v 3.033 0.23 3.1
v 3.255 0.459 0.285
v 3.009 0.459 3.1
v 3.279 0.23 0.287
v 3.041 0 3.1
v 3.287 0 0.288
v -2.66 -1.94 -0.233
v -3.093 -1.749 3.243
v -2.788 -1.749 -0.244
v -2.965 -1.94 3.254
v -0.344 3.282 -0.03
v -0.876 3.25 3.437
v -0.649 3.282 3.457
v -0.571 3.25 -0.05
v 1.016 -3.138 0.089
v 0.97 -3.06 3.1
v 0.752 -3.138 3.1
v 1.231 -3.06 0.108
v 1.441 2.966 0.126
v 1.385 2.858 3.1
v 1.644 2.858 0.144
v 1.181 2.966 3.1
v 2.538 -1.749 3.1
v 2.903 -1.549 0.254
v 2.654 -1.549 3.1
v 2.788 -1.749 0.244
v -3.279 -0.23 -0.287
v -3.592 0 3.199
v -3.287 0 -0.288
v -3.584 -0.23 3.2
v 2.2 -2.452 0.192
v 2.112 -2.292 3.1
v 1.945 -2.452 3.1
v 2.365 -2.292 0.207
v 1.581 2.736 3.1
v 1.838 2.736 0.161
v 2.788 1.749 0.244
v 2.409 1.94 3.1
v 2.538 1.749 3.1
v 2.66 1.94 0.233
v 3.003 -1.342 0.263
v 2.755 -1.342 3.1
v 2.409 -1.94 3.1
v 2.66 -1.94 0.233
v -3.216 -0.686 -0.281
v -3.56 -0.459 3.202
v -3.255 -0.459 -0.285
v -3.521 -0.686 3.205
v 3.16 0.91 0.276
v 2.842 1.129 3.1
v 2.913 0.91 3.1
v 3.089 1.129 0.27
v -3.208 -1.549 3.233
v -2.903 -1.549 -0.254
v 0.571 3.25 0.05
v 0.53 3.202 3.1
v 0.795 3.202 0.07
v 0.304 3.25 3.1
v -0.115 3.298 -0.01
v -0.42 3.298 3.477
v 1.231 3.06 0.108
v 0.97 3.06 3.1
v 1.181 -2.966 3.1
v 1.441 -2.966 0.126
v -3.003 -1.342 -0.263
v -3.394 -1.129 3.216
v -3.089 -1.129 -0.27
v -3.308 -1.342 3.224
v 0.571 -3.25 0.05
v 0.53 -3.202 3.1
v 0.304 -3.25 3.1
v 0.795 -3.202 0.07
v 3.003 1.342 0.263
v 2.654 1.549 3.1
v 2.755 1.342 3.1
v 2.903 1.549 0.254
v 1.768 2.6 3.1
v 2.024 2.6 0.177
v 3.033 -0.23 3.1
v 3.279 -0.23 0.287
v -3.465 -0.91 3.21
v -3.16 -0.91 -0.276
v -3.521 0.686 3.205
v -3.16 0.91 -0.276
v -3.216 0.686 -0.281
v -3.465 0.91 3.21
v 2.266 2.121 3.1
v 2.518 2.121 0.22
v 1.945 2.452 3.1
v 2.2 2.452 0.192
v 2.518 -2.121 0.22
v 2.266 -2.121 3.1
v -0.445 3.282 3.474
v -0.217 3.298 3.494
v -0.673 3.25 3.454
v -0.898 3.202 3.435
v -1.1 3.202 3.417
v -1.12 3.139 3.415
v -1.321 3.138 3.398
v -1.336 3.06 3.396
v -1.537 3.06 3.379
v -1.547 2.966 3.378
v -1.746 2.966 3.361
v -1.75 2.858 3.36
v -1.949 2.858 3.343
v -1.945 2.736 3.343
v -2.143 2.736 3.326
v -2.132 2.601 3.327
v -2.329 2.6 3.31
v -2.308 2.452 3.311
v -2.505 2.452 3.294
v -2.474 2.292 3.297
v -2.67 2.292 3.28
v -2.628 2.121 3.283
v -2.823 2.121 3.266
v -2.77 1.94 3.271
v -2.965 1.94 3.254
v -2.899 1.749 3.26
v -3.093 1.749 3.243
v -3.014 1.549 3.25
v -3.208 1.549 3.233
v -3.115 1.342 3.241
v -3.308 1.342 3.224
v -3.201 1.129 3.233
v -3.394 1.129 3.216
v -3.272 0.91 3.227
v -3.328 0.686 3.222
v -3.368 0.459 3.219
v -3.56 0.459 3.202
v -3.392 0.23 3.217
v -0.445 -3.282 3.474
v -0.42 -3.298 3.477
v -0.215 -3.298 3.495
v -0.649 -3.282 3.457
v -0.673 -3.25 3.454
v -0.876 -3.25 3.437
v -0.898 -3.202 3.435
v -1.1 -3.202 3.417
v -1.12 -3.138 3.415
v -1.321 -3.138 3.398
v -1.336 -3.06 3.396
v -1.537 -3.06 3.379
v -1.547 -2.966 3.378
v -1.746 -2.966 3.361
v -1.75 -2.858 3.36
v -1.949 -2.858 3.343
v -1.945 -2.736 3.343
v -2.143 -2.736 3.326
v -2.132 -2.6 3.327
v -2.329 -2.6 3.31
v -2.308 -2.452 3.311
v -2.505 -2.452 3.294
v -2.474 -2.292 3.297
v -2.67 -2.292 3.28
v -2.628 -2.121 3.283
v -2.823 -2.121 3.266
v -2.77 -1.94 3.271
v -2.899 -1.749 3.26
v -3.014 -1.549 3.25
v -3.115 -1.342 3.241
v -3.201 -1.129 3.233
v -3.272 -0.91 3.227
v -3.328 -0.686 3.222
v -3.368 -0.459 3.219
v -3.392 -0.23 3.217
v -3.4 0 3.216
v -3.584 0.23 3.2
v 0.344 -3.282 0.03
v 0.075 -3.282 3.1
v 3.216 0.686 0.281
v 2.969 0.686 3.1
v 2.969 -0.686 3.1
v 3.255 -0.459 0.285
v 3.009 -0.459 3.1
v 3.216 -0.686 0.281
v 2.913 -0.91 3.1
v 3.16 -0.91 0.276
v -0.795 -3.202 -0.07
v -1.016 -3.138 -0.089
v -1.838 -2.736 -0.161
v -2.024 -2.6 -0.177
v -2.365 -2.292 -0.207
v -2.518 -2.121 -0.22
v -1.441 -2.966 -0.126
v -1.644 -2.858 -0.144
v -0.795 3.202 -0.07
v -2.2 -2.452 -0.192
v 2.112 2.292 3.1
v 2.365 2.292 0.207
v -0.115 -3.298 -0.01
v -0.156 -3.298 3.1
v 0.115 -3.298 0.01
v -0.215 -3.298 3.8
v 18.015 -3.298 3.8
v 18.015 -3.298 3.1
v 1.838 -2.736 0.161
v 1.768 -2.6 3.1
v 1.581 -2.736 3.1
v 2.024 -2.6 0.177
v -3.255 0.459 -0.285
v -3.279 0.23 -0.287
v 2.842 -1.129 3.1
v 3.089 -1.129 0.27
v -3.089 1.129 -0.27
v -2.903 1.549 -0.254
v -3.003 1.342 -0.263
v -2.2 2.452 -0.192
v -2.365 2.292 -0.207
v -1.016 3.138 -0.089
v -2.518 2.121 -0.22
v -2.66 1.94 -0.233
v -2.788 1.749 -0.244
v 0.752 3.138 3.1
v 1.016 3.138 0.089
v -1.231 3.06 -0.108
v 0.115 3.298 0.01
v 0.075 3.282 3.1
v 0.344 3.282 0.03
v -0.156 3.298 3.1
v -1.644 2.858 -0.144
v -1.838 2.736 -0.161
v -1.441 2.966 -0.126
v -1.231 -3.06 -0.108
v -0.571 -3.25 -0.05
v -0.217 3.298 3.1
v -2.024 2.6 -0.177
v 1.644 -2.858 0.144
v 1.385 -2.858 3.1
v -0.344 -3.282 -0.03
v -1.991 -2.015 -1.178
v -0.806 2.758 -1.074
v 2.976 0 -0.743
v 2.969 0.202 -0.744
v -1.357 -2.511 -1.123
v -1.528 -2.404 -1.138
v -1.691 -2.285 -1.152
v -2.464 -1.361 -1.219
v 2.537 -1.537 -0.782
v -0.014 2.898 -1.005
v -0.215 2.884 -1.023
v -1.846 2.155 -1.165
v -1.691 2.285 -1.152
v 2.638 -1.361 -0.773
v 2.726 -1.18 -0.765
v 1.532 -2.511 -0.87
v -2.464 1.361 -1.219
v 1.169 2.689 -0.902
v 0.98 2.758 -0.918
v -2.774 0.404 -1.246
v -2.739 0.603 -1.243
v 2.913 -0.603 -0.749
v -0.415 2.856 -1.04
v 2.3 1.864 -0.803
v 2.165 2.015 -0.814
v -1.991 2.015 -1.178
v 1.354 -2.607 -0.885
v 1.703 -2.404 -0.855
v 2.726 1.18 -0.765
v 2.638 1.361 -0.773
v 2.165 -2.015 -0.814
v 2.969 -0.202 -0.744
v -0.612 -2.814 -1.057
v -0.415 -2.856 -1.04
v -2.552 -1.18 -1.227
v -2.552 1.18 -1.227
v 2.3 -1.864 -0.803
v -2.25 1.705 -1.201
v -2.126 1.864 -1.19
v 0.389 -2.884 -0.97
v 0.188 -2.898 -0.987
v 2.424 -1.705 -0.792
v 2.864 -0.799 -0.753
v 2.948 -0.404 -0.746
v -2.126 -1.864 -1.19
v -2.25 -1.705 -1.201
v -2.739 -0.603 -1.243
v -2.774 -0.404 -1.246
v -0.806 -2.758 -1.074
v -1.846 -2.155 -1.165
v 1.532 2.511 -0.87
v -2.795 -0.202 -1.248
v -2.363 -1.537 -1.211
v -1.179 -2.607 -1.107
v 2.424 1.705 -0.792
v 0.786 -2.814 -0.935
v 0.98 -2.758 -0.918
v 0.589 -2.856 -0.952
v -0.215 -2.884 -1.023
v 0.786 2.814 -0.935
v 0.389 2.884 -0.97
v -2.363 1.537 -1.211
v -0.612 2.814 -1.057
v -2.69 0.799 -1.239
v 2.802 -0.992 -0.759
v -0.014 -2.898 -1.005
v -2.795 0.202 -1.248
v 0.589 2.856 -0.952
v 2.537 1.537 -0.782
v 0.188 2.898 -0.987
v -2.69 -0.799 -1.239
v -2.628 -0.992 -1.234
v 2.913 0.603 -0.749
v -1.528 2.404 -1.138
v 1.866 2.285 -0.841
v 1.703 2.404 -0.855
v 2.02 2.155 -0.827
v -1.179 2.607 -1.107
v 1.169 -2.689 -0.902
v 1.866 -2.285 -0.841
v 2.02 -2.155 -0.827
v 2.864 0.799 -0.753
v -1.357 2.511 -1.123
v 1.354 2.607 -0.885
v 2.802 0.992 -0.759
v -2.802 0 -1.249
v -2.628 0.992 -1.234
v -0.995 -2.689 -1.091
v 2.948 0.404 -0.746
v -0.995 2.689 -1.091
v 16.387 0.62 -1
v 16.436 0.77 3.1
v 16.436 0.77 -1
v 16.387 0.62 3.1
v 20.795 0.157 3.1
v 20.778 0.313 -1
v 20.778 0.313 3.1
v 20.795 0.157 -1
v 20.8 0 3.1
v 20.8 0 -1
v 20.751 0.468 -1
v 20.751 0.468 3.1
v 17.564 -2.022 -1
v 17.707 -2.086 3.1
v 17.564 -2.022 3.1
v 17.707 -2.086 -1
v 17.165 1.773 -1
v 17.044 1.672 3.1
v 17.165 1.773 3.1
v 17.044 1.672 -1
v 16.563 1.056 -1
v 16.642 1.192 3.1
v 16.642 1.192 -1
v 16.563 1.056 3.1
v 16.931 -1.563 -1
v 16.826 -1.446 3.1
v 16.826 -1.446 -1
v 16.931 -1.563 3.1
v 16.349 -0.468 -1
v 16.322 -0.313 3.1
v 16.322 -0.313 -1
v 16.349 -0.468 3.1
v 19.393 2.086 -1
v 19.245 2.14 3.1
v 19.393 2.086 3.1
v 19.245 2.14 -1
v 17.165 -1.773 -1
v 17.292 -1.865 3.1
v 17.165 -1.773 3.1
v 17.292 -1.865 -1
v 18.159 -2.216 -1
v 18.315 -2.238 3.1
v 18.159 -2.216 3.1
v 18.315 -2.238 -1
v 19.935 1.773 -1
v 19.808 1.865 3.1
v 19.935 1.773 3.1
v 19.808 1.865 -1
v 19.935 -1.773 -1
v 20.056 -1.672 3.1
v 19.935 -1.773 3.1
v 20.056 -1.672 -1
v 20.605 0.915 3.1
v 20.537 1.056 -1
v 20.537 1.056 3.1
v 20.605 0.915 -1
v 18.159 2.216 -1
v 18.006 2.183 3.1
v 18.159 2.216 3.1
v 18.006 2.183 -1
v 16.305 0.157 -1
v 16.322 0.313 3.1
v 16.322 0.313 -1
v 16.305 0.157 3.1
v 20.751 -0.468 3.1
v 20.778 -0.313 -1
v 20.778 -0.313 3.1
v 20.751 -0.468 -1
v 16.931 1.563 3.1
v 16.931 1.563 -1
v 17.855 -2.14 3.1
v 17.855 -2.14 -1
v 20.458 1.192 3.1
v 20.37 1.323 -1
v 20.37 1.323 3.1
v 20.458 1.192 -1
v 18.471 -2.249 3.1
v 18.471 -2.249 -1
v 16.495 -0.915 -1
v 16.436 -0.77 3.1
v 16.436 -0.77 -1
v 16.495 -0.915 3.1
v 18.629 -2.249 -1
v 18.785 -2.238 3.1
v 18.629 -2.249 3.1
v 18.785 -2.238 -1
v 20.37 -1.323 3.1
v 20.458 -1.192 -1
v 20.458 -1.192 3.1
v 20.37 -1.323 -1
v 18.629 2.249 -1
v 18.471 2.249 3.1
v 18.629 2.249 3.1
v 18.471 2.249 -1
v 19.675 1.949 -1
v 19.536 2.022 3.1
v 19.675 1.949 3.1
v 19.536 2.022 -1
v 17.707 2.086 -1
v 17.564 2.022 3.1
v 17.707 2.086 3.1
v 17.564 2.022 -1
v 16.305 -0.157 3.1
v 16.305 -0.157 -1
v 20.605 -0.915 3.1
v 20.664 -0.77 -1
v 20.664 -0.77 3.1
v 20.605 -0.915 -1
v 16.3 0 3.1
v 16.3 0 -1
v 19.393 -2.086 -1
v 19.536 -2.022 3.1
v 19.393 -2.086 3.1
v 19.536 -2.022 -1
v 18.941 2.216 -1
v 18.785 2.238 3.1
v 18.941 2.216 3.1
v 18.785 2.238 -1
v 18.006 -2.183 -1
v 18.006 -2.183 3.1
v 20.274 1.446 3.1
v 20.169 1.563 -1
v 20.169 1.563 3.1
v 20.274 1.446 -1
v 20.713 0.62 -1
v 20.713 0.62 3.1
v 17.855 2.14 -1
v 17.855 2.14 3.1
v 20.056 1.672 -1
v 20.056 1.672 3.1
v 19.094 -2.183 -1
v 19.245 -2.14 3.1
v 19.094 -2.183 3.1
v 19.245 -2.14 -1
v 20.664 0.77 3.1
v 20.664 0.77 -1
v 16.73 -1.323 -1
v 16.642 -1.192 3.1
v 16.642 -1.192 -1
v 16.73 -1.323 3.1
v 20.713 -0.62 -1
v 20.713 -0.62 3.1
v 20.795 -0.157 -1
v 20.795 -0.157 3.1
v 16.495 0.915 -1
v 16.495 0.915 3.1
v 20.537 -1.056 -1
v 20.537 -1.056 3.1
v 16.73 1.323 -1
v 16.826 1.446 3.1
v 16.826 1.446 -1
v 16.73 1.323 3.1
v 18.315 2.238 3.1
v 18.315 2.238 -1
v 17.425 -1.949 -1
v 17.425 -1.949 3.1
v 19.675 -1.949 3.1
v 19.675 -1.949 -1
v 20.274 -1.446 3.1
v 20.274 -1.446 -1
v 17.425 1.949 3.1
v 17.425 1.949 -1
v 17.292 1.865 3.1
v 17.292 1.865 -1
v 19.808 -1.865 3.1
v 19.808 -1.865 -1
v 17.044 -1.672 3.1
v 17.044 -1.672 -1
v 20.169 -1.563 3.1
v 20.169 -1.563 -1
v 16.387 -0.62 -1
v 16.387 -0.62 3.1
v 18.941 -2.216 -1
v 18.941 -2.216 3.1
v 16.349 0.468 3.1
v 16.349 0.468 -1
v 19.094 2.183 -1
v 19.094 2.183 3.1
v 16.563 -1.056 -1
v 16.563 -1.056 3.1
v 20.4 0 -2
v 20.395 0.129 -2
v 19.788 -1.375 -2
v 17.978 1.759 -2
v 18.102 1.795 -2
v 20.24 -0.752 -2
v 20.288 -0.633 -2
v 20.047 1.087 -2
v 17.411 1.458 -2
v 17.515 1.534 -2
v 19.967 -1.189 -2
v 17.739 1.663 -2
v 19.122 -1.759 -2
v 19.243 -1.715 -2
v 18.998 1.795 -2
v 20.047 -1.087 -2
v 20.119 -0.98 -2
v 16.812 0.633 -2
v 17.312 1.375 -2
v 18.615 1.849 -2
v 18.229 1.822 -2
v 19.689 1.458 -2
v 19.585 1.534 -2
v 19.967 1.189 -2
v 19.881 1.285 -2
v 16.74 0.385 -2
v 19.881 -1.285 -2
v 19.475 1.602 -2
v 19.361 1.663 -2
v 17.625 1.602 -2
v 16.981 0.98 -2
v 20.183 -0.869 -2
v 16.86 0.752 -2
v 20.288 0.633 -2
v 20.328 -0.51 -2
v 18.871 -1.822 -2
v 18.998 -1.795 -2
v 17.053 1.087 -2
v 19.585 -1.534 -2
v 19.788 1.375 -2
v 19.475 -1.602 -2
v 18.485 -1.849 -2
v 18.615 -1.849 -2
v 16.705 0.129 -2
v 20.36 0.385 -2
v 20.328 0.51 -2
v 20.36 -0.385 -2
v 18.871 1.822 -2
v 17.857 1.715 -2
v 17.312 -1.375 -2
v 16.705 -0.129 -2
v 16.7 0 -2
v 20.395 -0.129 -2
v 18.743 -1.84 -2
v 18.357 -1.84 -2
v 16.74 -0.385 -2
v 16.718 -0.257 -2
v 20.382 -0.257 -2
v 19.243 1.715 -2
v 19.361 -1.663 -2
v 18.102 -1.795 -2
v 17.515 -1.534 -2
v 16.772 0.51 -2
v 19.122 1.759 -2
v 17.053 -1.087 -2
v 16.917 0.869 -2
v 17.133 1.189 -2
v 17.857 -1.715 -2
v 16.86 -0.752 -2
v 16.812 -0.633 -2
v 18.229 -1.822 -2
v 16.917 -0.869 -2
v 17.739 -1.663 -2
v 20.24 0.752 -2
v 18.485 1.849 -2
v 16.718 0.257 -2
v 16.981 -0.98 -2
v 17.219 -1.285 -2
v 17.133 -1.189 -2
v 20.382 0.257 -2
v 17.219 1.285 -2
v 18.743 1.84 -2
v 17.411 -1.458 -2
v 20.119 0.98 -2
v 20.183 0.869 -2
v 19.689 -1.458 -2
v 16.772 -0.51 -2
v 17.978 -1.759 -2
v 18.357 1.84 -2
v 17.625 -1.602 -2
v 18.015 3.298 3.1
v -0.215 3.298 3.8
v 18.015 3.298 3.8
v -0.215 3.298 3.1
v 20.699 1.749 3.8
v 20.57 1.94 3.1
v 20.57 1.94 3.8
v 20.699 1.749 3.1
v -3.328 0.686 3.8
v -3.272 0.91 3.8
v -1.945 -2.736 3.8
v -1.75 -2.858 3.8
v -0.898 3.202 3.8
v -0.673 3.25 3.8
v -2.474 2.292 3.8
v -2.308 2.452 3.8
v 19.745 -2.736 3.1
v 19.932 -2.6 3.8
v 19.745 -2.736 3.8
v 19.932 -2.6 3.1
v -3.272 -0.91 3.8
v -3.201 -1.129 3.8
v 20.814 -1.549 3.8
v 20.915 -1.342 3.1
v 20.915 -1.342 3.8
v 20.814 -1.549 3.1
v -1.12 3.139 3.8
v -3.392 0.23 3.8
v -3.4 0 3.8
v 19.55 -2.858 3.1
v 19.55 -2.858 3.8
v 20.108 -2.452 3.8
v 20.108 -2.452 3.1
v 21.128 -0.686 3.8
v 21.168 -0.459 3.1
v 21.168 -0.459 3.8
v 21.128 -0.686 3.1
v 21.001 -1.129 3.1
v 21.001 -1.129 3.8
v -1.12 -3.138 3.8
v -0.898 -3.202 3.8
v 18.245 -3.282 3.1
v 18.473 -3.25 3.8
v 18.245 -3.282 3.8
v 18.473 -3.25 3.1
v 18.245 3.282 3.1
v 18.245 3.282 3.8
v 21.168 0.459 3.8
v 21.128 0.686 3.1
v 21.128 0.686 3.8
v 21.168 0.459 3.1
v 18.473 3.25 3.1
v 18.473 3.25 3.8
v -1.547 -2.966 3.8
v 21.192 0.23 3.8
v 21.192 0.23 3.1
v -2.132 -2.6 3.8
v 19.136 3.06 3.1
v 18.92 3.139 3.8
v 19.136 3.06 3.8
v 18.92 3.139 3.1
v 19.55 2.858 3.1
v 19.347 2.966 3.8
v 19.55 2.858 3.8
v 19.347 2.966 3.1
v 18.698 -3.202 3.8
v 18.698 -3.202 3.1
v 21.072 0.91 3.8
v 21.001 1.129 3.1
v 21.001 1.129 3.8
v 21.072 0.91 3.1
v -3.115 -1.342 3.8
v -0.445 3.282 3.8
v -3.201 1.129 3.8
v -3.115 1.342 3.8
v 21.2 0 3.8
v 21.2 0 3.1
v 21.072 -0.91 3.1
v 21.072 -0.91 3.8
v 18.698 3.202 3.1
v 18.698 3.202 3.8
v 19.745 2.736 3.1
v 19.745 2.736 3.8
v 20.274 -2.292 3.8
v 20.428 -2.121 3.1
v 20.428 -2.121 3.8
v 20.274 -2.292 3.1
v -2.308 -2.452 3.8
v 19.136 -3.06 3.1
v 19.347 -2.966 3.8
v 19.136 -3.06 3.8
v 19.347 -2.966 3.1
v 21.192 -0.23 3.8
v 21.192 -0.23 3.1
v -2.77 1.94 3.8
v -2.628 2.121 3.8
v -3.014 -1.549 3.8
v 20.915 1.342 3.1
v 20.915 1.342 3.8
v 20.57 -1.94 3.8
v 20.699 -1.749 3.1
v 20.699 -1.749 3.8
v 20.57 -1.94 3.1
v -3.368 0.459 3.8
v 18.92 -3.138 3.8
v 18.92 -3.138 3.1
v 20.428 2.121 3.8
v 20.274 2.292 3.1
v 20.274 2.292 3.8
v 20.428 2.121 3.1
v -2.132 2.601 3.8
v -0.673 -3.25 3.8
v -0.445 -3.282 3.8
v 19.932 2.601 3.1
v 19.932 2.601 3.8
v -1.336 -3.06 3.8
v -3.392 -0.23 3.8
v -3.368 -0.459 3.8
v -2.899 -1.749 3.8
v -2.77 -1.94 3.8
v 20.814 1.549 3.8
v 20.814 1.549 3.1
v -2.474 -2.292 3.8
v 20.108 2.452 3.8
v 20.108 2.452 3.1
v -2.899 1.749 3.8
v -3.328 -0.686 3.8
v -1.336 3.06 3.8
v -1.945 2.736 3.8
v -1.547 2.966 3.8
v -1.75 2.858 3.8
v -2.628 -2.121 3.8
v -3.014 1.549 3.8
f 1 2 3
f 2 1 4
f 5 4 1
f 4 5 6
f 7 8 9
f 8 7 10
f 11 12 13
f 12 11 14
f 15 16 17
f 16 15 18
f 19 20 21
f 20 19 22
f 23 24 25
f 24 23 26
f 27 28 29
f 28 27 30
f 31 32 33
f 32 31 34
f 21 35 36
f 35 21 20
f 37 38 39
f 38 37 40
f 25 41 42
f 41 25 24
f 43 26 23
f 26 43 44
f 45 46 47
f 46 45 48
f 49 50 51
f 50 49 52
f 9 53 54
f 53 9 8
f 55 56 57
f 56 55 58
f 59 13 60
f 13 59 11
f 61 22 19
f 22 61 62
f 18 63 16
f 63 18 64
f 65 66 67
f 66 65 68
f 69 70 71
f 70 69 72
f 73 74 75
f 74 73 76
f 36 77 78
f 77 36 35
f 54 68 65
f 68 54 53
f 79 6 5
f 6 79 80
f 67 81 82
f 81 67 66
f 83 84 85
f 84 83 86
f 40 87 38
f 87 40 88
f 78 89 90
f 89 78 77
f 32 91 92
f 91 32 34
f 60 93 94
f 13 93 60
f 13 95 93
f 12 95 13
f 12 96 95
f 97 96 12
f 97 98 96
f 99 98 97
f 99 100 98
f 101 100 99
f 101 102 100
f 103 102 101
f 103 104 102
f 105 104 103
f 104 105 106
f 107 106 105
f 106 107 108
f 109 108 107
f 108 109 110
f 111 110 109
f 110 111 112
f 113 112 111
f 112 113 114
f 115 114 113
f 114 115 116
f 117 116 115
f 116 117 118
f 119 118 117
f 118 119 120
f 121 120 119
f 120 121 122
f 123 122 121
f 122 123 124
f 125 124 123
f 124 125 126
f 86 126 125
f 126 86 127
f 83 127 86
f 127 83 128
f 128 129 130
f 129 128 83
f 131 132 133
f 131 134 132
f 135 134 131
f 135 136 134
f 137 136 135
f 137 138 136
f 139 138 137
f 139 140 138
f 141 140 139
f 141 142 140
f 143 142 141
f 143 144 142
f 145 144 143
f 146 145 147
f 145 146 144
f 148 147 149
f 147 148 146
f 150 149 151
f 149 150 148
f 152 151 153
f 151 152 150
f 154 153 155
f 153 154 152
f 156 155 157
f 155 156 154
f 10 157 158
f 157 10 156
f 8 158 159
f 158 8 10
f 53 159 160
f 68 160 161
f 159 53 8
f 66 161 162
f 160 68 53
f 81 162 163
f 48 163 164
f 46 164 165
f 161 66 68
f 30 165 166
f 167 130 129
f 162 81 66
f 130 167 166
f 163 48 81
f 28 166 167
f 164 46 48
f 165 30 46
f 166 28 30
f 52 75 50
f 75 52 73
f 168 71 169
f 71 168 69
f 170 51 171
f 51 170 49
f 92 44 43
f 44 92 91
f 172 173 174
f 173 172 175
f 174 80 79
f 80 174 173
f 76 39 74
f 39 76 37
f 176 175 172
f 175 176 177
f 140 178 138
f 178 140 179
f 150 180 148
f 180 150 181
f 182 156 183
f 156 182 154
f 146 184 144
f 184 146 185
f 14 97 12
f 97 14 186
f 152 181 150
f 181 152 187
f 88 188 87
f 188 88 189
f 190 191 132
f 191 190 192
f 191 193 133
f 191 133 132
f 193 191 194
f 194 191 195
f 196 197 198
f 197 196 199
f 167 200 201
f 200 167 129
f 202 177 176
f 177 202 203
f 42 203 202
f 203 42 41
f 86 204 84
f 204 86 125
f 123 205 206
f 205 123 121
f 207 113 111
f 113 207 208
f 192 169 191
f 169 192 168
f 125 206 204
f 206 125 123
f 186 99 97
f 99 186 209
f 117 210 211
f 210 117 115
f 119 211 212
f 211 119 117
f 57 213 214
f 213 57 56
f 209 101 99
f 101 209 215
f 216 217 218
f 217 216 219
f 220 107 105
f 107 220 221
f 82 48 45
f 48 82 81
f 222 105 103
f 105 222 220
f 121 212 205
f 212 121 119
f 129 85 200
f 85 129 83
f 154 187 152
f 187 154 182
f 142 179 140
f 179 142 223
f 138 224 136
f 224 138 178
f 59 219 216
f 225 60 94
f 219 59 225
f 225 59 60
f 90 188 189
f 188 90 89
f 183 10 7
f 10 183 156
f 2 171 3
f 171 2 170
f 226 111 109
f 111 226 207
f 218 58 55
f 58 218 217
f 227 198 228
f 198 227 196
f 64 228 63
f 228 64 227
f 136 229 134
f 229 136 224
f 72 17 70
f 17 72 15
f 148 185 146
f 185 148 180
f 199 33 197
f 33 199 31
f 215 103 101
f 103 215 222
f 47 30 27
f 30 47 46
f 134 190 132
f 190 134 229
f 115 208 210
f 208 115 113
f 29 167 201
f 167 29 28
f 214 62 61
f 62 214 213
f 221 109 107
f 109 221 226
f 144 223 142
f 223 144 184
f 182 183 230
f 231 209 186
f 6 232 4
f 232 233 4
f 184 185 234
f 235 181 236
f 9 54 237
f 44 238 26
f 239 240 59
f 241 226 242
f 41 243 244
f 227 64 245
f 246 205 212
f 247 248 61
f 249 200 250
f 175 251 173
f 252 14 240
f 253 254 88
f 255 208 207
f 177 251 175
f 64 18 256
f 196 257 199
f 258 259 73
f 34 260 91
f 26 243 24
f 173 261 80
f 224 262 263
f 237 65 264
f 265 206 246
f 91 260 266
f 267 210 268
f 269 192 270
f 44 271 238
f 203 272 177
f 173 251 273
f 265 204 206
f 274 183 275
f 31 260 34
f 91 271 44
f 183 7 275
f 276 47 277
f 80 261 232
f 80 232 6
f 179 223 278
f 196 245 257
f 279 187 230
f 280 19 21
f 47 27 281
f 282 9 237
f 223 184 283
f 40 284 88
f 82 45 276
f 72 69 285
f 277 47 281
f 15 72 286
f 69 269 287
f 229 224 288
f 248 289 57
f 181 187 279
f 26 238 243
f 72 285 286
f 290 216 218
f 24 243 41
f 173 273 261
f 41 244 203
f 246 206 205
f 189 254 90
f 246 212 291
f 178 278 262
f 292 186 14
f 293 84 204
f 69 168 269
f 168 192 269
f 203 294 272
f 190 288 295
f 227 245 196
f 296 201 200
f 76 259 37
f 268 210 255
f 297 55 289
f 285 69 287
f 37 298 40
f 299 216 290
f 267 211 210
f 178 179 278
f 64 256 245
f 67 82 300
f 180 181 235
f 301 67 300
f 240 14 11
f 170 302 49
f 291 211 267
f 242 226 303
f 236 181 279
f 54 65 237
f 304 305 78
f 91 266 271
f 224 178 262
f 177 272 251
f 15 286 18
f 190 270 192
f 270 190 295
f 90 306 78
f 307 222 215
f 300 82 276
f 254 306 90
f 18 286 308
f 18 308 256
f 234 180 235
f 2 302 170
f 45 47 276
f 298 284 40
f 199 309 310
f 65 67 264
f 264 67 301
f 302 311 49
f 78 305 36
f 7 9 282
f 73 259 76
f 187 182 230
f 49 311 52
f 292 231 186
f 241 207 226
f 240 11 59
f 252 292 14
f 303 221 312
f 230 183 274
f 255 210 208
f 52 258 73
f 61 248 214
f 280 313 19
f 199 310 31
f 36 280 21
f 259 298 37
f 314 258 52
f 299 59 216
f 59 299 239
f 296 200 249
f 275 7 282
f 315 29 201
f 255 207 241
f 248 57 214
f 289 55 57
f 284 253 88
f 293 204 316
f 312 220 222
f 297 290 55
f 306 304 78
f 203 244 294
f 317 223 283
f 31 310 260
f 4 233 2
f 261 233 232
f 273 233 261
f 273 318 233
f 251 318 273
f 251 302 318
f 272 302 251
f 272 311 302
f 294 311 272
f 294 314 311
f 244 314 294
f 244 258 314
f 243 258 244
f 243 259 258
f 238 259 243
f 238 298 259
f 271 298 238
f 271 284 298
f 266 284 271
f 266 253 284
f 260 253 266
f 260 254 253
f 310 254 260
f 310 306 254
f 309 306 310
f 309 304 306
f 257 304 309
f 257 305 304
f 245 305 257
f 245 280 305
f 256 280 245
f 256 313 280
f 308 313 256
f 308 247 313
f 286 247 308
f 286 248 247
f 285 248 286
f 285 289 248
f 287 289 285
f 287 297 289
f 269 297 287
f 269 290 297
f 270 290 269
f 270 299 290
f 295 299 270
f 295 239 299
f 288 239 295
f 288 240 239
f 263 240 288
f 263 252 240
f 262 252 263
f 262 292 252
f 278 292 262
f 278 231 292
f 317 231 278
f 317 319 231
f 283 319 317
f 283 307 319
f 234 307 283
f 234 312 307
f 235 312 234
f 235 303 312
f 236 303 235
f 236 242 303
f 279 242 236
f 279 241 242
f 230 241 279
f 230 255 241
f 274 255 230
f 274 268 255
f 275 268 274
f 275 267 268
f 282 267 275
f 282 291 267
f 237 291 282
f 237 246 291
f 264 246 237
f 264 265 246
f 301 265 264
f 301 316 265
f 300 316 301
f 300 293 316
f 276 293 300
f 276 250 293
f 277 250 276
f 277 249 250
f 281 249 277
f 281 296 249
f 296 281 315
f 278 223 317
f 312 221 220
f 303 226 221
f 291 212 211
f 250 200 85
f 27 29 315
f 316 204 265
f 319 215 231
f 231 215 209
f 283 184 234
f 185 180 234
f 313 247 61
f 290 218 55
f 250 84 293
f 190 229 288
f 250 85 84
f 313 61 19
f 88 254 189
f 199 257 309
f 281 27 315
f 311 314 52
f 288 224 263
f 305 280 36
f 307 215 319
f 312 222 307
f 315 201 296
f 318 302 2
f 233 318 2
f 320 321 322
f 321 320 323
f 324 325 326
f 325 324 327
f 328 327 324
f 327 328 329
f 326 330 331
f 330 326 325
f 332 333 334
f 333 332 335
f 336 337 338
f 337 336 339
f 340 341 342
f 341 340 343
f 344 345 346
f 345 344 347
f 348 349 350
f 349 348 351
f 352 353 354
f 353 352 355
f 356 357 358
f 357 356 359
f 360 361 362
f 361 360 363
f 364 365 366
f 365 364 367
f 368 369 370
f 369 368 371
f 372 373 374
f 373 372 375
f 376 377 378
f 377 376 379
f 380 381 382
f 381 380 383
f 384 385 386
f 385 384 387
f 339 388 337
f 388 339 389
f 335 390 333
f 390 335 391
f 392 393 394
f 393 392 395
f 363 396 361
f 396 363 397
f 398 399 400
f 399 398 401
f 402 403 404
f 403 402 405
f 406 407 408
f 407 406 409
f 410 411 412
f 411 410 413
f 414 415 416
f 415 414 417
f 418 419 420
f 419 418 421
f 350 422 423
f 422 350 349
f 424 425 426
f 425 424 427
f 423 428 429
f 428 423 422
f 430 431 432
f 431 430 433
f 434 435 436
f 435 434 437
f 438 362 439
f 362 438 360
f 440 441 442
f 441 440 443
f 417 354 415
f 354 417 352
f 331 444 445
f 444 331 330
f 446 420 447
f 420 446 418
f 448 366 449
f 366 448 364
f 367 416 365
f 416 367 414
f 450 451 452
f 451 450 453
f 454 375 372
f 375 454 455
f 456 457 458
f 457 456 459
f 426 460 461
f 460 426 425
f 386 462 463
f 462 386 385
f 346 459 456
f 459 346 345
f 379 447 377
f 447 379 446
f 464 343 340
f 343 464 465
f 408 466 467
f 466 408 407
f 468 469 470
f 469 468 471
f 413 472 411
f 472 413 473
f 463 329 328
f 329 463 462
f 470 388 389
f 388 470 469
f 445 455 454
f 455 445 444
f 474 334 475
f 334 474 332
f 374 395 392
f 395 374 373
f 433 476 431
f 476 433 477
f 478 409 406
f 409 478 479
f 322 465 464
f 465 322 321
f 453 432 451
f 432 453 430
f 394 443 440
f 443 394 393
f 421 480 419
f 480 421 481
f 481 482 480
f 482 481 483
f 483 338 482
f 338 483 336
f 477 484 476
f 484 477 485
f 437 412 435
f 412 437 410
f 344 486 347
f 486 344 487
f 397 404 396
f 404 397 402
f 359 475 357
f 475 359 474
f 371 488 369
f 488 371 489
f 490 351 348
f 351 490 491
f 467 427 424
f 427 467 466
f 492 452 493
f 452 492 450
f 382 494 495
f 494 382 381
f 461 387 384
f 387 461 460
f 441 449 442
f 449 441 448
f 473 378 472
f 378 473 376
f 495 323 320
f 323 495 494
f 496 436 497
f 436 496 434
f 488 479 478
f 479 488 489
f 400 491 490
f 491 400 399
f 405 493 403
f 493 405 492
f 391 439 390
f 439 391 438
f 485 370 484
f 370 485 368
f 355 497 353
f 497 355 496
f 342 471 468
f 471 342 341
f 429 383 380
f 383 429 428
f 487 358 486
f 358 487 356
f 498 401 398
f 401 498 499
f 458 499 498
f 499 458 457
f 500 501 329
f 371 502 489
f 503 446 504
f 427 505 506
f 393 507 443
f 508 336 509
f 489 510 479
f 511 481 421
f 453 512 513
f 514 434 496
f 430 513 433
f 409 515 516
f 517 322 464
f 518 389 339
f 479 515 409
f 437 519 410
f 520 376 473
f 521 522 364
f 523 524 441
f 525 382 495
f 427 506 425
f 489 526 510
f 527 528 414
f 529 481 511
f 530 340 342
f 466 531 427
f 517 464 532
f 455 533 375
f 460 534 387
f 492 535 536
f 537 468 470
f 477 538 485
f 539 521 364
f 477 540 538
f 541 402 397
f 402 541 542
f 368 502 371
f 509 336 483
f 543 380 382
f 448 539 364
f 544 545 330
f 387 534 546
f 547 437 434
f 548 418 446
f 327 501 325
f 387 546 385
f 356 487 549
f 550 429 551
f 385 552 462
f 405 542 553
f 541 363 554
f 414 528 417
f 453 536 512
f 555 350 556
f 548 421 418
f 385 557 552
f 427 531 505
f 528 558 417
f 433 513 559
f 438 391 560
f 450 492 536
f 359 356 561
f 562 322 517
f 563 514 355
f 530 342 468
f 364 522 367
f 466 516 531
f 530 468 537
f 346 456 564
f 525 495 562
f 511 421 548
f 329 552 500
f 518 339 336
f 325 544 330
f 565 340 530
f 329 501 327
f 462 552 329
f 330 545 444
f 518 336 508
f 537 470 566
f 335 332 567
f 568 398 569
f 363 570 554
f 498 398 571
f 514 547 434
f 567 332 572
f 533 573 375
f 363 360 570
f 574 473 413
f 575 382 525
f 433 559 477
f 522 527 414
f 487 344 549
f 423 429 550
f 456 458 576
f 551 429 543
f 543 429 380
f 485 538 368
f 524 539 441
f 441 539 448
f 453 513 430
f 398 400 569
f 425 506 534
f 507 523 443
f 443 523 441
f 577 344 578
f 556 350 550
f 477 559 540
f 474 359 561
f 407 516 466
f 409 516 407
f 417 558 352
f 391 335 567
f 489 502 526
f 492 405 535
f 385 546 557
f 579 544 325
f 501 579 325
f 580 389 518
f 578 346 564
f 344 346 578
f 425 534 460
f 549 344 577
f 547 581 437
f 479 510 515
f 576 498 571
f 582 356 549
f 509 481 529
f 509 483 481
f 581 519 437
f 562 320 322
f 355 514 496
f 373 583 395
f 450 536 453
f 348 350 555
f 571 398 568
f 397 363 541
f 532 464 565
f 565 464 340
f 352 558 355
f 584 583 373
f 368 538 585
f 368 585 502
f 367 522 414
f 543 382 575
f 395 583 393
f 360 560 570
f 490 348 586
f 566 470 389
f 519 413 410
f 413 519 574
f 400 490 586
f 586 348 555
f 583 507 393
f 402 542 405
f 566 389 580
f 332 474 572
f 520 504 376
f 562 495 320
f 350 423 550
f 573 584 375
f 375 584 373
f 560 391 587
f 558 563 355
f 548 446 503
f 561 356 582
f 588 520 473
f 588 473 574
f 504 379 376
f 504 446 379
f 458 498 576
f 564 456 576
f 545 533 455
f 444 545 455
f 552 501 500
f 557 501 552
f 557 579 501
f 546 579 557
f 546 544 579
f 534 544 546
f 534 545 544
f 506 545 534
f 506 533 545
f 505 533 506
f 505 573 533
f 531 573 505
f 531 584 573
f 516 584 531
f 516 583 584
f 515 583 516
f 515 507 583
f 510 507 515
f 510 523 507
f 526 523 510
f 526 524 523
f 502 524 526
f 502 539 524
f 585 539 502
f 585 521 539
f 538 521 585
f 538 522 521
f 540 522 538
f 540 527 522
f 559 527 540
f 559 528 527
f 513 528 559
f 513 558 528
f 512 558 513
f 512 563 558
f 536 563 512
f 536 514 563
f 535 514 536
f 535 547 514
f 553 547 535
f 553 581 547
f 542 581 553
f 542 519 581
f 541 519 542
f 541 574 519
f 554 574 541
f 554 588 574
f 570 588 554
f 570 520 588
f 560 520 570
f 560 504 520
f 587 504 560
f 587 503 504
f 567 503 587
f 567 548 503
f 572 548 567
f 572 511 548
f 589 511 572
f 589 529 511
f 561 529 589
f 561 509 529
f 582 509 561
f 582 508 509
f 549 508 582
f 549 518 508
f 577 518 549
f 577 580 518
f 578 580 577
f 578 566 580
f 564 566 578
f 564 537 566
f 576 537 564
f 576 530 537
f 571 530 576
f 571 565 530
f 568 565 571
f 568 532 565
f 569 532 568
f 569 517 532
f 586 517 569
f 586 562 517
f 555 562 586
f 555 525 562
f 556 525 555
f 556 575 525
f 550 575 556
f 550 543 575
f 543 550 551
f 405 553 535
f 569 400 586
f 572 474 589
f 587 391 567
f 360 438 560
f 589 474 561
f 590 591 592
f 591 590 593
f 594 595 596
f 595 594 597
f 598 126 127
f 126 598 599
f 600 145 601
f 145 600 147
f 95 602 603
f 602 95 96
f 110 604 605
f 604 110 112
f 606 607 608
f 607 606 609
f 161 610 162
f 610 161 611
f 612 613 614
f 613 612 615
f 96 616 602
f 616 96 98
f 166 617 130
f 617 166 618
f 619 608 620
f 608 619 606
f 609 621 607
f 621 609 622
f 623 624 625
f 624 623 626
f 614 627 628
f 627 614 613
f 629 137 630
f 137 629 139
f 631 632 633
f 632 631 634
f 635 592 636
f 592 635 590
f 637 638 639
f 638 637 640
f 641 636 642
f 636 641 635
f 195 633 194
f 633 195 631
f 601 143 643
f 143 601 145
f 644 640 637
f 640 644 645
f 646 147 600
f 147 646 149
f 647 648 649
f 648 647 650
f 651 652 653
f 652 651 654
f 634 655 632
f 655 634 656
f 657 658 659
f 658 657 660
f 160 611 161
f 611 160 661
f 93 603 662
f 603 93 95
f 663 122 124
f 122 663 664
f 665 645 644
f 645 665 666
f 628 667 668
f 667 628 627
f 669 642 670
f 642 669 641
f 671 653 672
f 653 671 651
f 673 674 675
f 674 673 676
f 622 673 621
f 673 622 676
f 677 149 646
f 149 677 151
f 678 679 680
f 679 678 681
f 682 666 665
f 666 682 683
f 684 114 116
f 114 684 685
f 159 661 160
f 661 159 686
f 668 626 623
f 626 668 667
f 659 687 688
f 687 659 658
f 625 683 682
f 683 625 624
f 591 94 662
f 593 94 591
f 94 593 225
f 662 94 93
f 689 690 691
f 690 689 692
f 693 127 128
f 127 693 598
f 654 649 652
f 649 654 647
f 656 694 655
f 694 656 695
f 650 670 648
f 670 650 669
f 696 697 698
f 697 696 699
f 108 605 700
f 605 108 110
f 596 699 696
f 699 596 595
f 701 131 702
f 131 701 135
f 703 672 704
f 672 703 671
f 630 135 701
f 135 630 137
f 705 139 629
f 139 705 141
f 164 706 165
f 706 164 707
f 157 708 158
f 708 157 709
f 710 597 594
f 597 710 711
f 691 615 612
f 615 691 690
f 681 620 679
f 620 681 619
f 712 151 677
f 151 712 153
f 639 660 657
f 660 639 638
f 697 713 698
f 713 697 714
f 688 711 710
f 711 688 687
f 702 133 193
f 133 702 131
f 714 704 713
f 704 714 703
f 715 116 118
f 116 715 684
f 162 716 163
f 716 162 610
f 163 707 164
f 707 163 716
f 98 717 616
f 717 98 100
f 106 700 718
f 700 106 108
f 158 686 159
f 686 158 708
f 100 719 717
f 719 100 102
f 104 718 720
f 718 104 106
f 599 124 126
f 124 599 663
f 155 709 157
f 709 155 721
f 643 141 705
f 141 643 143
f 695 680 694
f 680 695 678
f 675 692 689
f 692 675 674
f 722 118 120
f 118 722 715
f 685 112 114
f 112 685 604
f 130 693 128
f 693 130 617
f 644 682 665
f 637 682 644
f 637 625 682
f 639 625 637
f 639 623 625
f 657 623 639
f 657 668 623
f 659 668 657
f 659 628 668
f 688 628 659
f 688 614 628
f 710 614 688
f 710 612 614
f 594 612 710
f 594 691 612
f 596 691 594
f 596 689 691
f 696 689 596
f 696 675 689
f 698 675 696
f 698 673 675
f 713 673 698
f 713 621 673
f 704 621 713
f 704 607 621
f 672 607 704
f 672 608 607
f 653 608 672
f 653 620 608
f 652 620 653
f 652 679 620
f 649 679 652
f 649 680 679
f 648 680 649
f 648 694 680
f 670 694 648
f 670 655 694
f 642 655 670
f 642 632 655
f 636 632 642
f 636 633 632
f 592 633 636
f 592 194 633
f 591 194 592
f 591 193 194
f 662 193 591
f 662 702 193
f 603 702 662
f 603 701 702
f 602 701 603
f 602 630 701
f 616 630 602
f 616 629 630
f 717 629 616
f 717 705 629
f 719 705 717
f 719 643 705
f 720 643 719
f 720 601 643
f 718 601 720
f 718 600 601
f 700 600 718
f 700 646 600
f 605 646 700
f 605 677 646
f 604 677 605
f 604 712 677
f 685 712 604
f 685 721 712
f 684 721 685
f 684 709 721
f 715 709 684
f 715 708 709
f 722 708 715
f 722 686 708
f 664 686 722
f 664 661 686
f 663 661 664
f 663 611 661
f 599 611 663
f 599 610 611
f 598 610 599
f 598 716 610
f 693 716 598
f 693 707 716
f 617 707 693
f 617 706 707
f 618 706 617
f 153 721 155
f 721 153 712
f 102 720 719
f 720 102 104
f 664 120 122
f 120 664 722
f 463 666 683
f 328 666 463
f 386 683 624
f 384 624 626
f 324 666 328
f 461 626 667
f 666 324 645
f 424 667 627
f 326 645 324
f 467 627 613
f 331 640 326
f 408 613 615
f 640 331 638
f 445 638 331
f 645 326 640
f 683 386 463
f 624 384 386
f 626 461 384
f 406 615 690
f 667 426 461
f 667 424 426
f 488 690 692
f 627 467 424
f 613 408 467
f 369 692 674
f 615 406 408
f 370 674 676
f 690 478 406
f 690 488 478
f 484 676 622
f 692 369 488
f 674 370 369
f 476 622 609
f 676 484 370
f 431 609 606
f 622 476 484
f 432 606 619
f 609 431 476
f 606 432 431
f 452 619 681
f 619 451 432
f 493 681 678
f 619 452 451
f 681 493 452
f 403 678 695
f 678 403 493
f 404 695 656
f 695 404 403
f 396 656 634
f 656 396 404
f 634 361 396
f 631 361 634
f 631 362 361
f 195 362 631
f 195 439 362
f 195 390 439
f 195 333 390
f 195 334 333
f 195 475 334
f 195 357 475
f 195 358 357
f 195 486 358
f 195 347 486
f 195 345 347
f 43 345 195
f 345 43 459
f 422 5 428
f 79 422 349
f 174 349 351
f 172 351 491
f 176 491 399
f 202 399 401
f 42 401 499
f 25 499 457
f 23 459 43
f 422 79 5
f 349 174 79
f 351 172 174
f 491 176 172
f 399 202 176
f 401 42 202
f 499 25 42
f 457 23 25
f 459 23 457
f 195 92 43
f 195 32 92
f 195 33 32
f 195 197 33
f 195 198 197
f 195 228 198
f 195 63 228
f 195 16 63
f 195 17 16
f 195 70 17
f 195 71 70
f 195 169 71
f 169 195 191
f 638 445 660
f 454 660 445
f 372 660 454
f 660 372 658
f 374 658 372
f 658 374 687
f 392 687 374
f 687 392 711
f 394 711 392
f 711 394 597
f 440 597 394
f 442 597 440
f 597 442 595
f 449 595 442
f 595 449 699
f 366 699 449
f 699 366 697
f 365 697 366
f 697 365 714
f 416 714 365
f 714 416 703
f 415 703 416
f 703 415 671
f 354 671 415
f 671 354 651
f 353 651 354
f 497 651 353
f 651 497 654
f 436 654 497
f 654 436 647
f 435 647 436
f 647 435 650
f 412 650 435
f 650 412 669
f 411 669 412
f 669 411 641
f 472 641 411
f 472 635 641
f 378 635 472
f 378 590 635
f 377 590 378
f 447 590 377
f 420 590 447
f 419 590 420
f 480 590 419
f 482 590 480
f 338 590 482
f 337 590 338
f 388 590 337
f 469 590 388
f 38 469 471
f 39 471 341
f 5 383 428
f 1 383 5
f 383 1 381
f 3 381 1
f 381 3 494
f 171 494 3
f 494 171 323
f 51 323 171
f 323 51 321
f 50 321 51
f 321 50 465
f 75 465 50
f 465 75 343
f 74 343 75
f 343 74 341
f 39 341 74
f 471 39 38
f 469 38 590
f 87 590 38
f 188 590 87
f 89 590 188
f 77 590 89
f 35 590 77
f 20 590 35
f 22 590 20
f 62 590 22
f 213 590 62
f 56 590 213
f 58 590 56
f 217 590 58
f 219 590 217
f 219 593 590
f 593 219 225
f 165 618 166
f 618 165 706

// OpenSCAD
$fn = 90;

d1 = 6.6;
d2 = 4.5;
height = 3.5;
distance = 13;
angle = 5;


bolts();
top();
//wing();

module bolts() {
    rotate([0, -angle, 0]) bolt(d1, height);
    translate([d1 / 2 + d2 / 2 + distance, 0, -1]) bolt(d2, height + 1);
}

module bolt(diameter, height) {
    cylinder(d = diameter, h = height);
    translate([0, 0, -1]) cylinder(d1 = diameter - 0.8, d2 = diameter, h = 1);
}

module top() {
    translate([-0.1, 0, 3.1]) minkowski() {
        cube([18, 0.0001, 0.7]);
        cylinder(d = d1, h = 0.0001);
    }
}

module wing() {
    s = 1.75;
    translate([20, 1, 3]) rotate([56, 0, 180]) scale([s, s, 1]) linear_extrude(1.2) {
        polygon([
            [0, 0],
            [12, 8],
            [25, 8],
            [13, 0],
            [0, 0]
        ]);
    }
    translate([20, -1.5, 3]) rotate([65, 0, 180]) scale([s, s-0.13, 1]) linear_extrude(1.2) {
        polygon([
            [0, 0],
            [12, 8],
            [25, 8],
            [13, 0],
            [0, 0]
        ]);
    }
}



/*
difference() {
    translate([-150, -21, 0]) import("helmetwing_left.stl");
    #translate([0, 18, -5.1]) cube([50, 1, 4]);
}*/
